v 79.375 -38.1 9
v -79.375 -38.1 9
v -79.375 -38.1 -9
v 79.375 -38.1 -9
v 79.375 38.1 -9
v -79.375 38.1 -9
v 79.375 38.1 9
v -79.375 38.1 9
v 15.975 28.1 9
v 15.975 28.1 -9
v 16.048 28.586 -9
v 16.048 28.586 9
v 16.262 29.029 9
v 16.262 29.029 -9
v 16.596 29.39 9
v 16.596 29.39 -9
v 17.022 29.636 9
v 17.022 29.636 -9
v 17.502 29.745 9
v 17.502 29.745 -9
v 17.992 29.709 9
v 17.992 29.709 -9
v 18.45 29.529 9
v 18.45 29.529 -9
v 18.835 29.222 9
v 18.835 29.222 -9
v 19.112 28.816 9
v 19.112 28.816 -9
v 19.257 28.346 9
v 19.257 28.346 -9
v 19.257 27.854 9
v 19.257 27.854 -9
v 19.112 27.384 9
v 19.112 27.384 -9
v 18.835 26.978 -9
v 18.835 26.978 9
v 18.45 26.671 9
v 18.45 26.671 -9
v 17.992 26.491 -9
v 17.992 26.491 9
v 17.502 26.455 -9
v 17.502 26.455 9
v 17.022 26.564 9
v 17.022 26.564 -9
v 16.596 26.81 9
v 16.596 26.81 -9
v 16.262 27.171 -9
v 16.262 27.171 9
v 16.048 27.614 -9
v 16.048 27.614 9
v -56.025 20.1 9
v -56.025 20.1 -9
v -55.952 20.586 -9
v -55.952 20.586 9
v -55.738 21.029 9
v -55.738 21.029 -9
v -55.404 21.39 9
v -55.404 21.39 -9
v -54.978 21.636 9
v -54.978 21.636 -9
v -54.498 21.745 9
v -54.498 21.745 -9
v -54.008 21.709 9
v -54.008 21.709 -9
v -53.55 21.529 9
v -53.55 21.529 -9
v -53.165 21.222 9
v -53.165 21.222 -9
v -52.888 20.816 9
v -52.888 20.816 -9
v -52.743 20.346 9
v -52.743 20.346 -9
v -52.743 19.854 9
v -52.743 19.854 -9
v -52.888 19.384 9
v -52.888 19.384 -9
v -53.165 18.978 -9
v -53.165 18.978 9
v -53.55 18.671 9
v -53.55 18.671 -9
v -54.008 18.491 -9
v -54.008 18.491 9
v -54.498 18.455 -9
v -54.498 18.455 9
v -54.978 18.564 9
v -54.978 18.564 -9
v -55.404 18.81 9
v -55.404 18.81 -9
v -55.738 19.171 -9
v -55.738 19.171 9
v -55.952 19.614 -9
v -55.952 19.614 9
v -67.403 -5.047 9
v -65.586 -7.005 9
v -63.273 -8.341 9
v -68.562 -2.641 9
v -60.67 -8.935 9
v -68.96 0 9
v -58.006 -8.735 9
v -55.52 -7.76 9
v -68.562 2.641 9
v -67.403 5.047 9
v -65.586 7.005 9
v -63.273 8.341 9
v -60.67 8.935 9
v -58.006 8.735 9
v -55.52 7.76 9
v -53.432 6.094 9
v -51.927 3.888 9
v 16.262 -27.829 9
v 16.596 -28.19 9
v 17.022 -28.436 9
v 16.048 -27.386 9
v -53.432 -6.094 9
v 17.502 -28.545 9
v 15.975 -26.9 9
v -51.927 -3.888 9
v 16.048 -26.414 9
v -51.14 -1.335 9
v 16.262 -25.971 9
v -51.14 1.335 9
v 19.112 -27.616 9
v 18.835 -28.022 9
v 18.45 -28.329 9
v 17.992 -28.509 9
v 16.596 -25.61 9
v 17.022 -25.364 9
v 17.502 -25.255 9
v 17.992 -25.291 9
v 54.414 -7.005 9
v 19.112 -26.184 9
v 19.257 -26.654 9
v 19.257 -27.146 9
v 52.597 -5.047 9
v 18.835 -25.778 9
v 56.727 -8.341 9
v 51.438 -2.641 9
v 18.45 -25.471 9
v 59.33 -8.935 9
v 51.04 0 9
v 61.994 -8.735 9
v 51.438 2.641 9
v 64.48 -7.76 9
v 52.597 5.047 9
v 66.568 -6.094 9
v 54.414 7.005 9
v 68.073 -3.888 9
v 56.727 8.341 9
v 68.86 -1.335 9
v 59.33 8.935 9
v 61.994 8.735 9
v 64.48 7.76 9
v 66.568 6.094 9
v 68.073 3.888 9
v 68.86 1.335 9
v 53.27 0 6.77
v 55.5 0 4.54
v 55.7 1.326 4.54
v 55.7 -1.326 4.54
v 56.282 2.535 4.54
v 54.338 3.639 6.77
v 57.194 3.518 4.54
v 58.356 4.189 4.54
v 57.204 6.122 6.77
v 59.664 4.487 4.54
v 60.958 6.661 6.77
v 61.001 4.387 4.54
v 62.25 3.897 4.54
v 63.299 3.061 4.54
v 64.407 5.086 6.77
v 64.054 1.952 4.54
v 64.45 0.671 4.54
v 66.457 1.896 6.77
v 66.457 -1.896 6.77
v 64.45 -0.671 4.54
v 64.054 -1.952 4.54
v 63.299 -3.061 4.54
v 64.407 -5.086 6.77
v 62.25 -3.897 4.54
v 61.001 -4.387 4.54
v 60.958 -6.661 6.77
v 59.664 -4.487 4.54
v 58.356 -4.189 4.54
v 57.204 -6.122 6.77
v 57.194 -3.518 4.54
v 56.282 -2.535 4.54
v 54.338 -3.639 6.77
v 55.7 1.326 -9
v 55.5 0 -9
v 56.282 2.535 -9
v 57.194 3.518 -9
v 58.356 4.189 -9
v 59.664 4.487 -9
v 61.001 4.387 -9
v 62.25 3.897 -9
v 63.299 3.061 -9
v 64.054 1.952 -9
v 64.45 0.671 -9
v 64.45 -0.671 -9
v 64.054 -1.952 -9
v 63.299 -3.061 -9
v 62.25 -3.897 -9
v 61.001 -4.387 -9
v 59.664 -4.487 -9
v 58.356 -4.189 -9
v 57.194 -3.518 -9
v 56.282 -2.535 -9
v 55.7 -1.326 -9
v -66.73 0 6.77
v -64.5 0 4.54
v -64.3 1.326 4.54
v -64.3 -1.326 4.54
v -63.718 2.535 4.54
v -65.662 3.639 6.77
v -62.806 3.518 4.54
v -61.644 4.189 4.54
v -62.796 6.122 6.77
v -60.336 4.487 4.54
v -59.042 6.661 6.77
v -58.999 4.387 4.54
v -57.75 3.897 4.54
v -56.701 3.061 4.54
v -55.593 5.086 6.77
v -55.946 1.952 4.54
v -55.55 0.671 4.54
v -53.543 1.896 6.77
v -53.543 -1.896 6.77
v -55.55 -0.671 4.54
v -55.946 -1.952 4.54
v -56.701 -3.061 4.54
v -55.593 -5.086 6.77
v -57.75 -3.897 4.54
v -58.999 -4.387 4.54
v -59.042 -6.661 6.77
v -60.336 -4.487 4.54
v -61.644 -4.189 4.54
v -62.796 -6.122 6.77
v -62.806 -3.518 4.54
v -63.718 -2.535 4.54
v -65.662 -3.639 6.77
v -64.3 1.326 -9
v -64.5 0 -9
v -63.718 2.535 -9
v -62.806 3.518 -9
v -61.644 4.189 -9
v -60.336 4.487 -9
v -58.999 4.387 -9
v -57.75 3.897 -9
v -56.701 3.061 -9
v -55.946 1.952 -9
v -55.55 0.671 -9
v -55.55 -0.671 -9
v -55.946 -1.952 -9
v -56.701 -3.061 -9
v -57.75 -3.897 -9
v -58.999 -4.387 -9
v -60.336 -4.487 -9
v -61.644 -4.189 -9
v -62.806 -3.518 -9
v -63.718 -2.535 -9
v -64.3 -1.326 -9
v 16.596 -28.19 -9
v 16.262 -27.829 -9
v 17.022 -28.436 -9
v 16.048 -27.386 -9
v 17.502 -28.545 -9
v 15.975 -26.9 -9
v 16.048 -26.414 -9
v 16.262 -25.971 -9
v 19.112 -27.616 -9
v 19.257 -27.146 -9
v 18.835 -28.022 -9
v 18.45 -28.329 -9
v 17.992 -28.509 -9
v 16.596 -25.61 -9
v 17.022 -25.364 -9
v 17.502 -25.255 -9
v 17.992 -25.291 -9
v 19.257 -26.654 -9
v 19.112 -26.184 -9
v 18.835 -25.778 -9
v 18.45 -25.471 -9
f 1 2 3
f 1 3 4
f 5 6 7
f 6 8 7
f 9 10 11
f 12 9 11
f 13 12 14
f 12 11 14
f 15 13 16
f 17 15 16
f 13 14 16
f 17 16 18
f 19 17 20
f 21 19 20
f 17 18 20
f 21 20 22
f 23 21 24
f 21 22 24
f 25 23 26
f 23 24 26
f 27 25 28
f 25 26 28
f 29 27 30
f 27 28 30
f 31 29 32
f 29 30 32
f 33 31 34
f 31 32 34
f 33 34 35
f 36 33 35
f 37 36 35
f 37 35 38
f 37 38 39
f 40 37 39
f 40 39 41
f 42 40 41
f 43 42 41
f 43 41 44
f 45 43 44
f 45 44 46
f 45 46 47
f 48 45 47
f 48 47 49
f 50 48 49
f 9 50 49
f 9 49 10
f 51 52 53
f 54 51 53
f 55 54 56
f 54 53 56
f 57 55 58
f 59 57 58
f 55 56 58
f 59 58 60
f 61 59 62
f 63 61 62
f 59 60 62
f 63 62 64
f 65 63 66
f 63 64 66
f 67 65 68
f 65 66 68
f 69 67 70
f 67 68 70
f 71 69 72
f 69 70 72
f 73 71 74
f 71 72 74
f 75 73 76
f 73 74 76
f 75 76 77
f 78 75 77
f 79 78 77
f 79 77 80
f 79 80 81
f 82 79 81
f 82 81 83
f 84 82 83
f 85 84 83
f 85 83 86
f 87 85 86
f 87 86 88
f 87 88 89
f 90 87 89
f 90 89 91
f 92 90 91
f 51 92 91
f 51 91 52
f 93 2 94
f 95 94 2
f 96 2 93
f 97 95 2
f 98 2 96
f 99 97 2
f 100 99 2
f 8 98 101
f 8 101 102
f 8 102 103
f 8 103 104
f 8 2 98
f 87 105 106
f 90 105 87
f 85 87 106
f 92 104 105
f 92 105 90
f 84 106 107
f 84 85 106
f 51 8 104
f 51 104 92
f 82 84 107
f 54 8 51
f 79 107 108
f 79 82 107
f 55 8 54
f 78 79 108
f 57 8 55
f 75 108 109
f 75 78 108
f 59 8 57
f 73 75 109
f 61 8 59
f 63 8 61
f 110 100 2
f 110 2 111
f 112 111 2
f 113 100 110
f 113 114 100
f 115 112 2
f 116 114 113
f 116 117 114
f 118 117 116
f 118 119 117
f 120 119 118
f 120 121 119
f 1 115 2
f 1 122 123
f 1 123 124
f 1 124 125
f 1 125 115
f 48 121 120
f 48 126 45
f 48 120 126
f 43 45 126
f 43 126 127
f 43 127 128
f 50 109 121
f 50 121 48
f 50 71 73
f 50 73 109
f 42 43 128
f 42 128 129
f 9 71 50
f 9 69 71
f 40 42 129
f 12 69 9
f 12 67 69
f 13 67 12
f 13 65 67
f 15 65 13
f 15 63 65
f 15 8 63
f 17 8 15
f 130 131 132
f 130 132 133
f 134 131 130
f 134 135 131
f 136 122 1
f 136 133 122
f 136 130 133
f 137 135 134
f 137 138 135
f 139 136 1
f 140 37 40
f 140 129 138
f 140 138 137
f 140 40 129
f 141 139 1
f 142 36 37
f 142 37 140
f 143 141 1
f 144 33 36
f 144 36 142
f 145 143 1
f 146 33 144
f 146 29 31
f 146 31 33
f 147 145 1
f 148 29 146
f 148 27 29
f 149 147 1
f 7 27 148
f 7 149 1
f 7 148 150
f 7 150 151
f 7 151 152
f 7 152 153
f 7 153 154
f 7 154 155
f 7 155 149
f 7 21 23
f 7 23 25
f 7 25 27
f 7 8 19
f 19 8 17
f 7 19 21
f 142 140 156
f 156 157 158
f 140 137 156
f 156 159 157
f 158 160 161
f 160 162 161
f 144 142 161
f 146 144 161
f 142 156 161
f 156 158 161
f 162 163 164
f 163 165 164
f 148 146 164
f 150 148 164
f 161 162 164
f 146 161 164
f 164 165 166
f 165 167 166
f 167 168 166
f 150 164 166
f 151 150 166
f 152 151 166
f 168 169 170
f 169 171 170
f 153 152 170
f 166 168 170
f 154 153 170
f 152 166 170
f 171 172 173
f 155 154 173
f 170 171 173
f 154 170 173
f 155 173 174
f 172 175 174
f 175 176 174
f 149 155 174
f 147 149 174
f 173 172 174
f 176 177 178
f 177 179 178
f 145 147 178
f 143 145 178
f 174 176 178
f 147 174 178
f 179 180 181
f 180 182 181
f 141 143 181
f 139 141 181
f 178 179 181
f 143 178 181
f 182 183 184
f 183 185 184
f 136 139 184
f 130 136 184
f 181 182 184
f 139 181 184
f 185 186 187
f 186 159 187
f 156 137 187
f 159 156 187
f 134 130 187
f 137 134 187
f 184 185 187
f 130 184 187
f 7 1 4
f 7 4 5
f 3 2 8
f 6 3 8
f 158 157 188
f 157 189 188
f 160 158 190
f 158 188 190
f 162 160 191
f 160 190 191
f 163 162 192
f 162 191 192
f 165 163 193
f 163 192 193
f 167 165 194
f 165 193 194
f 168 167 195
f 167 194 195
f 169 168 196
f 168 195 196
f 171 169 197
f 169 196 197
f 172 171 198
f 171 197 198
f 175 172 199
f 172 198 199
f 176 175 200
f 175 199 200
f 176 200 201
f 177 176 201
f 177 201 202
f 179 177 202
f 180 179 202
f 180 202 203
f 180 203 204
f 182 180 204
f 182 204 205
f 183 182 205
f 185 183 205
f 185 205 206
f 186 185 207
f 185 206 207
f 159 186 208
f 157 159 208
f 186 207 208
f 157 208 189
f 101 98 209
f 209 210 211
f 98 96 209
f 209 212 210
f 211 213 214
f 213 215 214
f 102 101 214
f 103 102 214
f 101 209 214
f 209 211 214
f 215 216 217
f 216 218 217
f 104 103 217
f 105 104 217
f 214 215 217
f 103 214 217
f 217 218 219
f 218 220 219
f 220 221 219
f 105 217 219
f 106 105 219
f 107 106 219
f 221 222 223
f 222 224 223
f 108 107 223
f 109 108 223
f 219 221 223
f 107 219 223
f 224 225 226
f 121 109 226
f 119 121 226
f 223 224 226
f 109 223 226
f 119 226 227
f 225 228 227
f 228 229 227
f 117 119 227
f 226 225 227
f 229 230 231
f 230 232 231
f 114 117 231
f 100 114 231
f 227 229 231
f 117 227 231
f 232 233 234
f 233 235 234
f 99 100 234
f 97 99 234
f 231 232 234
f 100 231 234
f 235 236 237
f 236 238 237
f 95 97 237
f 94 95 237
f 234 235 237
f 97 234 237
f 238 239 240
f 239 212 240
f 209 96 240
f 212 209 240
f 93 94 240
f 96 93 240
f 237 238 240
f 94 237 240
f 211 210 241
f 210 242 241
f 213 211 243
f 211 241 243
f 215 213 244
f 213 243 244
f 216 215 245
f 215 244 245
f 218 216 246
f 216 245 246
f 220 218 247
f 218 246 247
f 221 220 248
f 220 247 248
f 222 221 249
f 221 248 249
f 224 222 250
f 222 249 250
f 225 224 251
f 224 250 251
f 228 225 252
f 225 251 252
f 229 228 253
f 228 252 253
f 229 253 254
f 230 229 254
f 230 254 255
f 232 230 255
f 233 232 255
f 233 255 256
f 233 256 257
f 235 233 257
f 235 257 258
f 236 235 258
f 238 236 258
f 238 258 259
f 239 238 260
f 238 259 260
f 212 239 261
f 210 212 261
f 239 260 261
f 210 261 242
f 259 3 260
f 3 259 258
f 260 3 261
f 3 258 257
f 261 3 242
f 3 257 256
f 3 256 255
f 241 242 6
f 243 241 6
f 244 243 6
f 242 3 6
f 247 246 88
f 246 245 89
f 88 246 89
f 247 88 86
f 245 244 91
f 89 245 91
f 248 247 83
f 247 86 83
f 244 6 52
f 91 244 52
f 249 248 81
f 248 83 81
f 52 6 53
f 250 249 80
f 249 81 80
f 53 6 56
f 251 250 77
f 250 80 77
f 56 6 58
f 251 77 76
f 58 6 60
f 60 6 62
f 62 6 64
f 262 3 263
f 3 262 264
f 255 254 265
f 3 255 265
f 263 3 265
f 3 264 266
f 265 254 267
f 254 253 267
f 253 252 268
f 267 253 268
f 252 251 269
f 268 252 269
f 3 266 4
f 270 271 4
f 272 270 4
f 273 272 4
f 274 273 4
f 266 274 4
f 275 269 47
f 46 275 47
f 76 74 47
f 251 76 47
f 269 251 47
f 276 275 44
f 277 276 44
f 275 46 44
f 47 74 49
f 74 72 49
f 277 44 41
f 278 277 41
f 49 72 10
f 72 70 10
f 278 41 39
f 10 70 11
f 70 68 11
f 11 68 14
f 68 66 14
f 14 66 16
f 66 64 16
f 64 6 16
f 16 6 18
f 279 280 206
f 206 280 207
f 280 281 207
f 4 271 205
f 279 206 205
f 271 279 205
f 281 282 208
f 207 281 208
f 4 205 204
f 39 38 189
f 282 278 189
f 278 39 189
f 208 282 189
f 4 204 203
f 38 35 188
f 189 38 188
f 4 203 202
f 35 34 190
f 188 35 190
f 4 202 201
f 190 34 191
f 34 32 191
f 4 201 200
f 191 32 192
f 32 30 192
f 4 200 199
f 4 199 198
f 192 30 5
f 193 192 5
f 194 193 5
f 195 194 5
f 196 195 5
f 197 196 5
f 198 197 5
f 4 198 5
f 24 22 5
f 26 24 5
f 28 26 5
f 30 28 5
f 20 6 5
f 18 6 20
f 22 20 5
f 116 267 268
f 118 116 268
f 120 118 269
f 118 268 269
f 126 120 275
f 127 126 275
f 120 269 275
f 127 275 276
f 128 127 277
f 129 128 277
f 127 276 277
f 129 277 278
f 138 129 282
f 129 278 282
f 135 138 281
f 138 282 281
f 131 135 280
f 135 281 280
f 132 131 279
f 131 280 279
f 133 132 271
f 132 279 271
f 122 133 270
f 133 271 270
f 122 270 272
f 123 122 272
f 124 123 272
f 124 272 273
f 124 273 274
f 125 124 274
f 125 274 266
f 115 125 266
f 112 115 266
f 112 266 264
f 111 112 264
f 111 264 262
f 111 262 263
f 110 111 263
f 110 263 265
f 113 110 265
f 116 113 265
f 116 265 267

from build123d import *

# Parameters (mm, degrees)
F0_W           = 158.75
F0_H           = 76.2
F1_DEPTH       = 9
F3_D           = 9
F3_CSINK_D     = 17.92
F3_CSINK_ANGLE = 90
F5_D           = 3.3


with BuildPart() as f1:
    # F0 (on Top) → F1 (new body, symmetric)
    with BuildSketch(Plane.XY):
        Rectangle(F0_W, F0_H)
    extrude(amount=F1_DEPTH, both=True)

    # F3 (through all)
    with Locations(Plane.XY.offset(9)):
        with Locations((-60, 0), (60, 0)):
            CounterSinkHole(F3_D / 2, F3_CSINK_D / 2, counter_sink_angle=F3_CSINK_ANGLE)

    # F5 (through all)
    with Locations(Plane.XY.offset(9)):
        with Locations((-54.375, 20.1), (17.625, 28.1), (17.625, -26.9)):
            Hole(F5_D / 2)


solid = f1.part
